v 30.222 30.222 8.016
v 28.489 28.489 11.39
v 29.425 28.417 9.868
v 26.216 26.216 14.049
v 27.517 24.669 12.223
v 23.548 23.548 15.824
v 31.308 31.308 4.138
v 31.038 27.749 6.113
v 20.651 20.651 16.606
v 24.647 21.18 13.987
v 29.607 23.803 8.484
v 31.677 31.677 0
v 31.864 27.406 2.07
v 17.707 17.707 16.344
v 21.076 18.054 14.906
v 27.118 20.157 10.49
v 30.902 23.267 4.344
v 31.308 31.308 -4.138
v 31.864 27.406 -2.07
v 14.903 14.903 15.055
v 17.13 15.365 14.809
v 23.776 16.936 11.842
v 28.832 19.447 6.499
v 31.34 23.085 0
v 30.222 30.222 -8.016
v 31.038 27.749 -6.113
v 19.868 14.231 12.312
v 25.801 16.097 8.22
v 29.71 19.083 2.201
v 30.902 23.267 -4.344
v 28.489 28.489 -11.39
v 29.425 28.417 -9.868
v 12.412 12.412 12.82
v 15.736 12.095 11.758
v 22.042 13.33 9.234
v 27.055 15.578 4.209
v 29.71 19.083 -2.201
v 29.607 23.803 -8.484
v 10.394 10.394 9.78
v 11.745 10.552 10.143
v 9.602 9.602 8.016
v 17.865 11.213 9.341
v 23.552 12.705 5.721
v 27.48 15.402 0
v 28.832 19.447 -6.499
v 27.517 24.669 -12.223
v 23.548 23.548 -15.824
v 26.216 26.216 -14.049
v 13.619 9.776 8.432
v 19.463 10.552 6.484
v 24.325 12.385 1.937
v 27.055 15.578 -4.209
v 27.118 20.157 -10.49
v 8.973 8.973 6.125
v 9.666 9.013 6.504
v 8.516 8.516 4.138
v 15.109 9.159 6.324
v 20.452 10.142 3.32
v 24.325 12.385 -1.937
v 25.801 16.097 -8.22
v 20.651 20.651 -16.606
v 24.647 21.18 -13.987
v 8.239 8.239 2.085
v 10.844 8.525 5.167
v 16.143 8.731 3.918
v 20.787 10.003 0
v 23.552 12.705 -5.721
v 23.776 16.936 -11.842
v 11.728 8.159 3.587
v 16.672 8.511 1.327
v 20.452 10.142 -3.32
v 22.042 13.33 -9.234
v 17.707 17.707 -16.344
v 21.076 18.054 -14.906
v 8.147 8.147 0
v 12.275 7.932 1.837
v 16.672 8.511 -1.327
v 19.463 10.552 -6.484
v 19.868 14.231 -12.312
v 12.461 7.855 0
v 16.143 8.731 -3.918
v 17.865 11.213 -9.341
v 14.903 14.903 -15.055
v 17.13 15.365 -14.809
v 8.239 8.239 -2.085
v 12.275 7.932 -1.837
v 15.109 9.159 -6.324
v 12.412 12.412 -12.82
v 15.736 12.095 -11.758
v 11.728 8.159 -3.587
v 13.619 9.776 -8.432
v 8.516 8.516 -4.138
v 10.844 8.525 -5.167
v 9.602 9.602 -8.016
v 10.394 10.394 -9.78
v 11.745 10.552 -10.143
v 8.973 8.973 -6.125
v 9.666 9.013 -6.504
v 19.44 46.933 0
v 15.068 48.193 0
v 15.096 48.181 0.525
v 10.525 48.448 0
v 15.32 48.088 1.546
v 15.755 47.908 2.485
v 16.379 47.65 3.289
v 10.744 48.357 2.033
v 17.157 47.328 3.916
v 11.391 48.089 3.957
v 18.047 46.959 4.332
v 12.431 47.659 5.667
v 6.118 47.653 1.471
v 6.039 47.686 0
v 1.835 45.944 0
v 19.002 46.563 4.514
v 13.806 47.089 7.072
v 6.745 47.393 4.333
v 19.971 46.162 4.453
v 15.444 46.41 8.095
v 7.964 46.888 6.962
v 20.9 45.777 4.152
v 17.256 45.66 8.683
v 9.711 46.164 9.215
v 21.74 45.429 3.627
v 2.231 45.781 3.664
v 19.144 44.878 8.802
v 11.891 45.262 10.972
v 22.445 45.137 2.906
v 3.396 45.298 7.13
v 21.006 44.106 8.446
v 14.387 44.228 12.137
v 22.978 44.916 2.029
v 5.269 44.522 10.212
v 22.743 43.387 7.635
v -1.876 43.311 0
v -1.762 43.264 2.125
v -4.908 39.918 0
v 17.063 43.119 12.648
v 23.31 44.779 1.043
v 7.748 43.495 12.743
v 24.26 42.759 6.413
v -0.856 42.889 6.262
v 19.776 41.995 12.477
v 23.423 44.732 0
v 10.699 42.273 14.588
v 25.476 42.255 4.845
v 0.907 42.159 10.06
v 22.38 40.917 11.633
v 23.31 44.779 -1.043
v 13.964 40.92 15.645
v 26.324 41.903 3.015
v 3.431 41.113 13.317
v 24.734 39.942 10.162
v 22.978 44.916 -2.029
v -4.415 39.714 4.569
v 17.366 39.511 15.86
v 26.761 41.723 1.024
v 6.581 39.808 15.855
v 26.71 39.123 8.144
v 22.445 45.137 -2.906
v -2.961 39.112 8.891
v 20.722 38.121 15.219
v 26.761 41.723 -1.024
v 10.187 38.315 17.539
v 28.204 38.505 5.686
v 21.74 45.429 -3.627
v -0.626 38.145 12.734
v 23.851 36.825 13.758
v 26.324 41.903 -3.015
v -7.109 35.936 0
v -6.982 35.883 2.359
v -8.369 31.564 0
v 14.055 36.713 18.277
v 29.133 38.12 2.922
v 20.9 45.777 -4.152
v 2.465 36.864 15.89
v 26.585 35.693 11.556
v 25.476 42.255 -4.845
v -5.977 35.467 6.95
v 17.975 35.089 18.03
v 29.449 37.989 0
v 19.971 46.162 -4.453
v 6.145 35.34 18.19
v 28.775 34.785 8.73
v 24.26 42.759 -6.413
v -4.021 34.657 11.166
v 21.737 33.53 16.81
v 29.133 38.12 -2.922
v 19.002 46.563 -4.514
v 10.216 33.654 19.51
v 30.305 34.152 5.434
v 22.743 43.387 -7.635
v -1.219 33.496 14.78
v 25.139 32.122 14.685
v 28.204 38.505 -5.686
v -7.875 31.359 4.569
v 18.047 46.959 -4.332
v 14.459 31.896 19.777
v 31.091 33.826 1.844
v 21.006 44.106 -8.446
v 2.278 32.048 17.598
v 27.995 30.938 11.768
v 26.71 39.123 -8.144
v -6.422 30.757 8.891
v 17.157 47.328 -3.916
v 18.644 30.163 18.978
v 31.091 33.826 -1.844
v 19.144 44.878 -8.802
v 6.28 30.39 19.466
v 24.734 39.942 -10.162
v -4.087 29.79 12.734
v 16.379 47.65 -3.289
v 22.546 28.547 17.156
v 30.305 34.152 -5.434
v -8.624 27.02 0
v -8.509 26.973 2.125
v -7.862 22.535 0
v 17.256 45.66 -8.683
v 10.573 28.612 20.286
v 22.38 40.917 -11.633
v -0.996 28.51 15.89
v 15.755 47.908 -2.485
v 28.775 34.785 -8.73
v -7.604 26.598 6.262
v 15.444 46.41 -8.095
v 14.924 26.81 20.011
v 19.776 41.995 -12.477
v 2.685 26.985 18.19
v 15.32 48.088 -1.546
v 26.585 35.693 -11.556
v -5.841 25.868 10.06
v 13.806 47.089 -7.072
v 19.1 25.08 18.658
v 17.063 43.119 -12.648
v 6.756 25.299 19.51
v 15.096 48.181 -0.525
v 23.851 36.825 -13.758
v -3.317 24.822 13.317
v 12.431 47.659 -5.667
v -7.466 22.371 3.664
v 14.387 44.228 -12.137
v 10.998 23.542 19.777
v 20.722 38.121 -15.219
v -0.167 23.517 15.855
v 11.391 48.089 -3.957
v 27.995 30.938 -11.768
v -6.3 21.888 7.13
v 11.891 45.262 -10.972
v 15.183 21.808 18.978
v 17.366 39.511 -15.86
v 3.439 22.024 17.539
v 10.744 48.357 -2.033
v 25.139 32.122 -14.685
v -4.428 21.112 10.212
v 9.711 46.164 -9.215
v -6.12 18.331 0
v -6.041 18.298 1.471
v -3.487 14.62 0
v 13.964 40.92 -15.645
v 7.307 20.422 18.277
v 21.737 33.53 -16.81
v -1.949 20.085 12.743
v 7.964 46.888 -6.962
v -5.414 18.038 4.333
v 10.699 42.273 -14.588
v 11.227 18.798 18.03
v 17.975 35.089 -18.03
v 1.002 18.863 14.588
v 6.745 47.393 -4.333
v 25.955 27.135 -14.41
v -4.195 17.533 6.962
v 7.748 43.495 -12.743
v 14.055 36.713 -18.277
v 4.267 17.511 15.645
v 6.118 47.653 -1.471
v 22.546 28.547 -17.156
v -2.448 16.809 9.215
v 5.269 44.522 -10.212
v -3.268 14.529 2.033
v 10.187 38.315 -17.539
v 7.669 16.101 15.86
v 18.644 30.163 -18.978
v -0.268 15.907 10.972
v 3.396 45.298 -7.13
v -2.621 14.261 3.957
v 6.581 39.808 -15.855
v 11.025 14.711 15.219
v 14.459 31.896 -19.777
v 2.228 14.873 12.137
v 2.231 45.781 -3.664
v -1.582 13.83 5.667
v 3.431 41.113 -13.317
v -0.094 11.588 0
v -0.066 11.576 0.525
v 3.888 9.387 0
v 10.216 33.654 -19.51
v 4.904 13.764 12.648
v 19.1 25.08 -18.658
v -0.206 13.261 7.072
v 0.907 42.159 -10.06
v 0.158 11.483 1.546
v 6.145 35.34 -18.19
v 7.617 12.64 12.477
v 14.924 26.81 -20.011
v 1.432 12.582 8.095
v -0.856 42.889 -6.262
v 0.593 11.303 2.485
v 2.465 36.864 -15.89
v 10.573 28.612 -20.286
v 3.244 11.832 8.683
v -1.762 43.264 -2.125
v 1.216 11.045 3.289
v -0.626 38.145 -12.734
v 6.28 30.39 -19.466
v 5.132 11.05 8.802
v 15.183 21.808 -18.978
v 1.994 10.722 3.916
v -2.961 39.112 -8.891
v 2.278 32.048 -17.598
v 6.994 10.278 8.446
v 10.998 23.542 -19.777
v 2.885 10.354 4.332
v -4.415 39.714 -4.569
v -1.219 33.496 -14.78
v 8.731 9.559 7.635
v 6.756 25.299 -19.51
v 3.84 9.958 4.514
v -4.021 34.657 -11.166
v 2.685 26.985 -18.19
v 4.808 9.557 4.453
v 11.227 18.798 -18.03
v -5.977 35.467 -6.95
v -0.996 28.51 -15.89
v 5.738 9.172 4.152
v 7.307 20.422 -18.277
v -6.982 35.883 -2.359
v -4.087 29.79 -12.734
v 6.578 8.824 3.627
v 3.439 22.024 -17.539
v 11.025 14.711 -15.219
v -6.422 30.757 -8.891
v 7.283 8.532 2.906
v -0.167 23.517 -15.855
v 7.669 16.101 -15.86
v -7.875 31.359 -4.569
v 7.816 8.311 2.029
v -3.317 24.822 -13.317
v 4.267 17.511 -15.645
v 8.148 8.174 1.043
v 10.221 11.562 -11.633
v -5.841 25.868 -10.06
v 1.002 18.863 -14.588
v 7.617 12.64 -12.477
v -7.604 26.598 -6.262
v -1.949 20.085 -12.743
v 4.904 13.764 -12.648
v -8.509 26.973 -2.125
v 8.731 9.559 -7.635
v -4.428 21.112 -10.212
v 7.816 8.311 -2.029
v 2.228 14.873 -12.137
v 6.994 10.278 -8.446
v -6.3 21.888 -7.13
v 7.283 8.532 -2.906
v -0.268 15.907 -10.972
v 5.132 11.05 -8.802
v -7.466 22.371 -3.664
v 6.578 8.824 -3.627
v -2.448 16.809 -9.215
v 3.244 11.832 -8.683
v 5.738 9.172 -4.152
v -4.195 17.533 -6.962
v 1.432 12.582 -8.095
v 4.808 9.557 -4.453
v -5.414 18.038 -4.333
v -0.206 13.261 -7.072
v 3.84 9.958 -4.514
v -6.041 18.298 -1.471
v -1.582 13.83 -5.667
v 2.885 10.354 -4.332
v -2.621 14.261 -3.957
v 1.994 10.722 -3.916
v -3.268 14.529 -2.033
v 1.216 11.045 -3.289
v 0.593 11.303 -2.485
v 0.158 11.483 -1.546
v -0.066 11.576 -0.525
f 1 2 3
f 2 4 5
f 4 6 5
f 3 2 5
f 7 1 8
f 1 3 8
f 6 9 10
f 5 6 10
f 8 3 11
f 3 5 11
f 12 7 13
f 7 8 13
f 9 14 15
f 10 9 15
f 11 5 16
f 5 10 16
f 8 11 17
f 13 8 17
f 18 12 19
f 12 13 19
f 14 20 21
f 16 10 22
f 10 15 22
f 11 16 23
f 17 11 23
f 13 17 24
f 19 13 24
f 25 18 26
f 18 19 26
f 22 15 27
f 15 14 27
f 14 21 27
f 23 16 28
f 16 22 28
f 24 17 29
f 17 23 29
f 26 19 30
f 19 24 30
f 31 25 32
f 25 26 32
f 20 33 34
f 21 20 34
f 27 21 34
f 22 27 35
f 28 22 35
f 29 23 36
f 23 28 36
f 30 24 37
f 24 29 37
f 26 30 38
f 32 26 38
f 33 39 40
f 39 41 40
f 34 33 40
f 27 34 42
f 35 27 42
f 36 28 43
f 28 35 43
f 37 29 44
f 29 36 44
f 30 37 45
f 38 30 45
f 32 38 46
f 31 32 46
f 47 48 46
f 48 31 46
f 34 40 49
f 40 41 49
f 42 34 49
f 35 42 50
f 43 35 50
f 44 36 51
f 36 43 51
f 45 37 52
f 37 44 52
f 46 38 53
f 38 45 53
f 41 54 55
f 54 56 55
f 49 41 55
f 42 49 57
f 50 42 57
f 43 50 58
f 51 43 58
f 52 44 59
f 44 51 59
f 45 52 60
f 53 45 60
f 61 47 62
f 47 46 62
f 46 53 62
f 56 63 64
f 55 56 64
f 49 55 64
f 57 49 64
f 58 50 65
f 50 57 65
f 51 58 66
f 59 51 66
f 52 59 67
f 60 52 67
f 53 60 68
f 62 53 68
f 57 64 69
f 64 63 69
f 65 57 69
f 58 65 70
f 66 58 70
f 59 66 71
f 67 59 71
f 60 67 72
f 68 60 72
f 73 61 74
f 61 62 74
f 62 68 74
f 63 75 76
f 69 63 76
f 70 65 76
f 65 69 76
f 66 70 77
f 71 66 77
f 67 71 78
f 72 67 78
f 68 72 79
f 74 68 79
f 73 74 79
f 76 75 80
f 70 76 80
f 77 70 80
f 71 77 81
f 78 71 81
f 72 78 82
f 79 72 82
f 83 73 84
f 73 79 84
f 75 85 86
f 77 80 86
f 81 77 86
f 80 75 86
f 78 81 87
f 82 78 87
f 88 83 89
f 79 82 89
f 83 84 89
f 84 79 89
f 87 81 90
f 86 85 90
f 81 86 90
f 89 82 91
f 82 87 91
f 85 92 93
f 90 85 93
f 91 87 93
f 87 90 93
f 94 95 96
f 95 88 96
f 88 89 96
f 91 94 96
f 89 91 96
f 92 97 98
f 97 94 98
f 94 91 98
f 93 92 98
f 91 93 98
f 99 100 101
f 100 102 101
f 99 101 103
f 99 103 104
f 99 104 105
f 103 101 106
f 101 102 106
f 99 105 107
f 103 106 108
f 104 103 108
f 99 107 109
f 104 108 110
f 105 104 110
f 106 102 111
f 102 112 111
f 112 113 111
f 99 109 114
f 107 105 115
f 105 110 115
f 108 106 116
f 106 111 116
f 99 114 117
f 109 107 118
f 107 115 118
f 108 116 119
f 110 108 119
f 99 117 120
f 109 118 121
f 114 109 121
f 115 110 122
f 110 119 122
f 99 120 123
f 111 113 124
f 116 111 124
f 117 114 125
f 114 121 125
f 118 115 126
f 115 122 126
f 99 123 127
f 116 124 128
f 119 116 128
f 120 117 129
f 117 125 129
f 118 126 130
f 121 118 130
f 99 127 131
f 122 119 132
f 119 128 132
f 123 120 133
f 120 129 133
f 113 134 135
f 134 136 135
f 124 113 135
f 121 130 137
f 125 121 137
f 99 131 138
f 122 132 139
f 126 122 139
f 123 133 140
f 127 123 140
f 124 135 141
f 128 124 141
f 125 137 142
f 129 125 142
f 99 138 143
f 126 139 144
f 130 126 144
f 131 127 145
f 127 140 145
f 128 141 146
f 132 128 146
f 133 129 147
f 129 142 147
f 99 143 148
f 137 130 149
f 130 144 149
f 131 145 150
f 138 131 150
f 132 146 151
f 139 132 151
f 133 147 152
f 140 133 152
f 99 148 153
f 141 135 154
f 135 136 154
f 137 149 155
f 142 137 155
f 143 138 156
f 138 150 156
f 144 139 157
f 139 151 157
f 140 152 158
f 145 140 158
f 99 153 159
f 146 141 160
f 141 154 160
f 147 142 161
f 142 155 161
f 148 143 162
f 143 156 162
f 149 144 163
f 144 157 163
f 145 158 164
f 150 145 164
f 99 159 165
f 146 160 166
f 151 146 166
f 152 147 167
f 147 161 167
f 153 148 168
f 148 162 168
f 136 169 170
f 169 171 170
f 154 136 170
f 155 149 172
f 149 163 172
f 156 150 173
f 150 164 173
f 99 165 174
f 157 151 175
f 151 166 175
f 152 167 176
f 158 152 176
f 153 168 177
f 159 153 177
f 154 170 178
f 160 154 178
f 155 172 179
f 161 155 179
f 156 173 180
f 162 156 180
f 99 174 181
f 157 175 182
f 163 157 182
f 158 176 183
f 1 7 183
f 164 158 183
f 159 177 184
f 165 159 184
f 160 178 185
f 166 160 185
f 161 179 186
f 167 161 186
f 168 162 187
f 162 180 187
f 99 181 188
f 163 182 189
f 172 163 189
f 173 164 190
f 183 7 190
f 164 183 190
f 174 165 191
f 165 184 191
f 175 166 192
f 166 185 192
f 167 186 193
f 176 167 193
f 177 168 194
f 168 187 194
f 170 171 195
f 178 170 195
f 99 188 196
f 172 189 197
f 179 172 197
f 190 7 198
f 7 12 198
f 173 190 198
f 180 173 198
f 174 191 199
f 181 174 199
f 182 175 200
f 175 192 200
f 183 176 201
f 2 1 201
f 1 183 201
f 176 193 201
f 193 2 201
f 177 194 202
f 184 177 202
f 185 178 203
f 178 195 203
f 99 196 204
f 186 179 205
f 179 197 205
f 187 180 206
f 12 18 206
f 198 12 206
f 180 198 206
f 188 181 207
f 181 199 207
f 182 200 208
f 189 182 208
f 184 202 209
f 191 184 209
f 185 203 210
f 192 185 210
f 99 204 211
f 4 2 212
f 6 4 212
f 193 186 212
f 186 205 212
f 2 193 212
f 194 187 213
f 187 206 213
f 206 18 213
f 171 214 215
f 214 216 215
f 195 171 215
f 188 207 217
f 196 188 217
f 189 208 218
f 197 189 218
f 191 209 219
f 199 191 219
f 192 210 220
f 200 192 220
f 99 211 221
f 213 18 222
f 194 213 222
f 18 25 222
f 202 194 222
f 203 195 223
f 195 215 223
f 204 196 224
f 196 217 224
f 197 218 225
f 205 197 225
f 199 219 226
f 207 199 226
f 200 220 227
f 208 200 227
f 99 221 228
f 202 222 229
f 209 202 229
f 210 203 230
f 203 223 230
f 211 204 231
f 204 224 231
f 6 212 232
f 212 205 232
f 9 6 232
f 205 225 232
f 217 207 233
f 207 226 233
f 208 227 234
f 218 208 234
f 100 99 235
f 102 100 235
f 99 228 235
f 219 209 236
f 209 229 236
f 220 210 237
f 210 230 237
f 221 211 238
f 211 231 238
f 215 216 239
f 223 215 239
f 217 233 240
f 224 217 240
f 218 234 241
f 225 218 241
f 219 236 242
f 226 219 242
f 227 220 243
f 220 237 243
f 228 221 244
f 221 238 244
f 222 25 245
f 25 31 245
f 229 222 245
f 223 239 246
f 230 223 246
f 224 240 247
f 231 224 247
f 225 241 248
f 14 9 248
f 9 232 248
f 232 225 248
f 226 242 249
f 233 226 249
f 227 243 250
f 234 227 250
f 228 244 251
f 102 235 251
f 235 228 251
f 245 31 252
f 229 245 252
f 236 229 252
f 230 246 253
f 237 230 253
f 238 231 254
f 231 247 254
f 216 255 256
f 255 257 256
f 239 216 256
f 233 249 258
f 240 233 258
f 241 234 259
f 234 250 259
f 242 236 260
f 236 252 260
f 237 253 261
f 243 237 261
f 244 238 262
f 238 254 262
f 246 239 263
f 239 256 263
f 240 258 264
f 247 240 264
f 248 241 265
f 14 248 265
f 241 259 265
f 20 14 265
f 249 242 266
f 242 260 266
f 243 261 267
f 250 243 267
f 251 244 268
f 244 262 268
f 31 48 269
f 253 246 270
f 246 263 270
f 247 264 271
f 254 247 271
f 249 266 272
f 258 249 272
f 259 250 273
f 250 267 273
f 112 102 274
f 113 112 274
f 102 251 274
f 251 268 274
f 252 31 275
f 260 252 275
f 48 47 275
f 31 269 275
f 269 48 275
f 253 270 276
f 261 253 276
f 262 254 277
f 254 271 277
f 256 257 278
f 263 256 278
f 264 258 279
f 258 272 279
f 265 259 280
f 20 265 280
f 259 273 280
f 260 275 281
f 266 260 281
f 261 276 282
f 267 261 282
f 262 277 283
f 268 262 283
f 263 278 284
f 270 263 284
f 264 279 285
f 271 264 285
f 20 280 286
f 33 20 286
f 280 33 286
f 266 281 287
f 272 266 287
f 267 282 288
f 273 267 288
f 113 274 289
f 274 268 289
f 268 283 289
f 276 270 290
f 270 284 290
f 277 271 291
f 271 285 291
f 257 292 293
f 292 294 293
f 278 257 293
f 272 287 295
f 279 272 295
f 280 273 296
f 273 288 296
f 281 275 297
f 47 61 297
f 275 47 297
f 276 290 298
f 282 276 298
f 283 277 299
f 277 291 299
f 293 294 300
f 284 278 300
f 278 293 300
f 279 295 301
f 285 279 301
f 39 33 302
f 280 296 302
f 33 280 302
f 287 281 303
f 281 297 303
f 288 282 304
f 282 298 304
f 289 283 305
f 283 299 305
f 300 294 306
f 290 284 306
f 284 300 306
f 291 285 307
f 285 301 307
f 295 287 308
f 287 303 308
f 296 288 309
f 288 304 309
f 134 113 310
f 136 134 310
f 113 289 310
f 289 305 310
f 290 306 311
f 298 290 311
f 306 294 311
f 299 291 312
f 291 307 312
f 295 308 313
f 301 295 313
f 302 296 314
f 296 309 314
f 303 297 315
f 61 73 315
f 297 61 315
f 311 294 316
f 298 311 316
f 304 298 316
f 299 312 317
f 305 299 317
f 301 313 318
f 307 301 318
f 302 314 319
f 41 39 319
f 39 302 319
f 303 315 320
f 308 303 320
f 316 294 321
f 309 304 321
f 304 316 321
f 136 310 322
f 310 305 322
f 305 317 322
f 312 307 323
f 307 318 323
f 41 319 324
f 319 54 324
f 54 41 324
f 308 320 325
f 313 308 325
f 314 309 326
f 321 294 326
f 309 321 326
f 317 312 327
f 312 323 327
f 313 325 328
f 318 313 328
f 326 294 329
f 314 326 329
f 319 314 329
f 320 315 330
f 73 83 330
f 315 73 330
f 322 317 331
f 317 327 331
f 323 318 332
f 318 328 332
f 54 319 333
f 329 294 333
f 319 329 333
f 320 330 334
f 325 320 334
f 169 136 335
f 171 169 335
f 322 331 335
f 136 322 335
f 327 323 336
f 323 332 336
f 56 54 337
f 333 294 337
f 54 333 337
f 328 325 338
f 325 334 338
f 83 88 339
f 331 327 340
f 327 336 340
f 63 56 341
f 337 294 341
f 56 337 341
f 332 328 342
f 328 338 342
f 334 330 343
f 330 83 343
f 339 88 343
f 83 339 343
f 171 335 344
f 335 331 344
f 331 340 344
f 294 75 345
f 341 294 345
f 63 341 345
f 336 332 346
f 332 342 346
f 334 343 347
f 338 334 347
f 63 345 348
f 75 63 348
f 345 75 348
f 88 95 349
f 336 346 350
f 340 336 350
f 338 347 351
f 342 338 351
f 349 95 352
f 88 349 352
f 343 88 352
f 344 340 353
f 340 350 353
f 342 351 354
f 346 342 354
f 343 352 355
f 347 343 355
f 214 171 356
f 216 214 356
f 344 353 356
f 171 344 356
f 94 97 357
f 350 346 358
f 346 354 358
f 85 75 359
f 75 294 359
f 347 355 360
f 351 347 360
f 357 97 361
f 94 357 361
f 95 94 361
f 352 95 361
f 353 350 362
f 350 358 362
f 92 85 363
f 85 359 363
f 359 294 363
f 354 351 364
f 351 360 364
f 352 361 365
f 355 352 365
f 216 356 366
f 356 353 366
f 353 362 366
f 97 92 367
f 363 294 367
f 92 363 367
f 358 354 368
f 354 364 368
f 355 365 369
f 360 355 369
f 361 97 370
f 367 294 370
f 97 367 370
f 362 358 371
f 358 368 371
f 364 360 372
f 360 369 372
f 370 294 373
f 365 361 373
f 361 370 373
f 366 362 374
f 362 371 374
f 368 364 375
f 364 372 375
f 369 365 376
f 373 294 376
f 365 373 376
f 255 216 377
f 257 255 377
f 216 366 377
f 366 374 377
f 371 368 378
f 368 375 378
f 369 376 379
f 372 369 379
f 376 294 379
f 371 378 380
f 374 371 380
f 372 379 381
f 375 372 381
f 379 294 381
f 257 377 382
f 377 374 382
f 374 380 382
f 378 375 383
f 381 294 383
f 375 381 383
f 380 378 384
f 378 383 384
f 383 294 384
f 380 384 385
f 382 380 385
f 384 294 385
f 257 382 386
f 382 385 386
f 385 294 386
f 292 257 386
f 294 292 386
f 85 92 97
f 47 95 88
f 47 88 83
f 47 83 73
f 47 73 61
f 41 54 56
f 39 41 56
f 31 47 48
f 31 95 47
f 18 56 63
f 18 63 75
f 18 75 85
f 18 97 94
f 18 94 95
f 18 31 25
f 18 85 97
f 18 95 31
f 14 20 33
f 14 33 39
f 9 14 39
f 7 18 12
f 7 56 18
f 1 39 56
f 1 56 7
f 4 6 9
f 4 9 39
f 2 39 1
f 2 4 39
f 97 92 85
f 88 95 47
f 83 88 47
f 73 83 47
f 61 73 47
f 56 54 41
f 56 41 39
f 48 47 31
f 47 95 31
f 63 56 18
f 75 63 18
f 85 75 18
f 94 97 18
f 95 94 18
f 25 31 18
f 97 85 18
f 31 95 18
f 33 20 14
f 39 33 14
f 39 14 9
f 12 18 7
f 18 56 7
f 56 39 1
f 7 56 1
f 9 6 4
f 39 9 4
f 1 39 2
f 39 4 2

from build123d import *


with BuildPart() as part:
    # Sketch1 → Revolve1 (revolve)
    with BuildSketch(Plane.XY):
        with BuildLine():
            Line((3.888063673, 9.38661605), (19.440318364, 46.933080252))
            ThreePointArc((19.440318364, 46.933080252), (-7.109041082, 35.935975497), (3.888063673, 9.38661605))
        make_face()
    revolve(axis=Axis((3.888063673, 9.38661605, 0), (0.3826834323650907, 0.9238795325112864, 0)))


with BuildPart() as body_2:
    # Intersect2: read off the stored shape, not the designer's step
    # Intersect2: the piece on the far side of the plane
    add(part.part)
    split(bisect_by=Plane(origin=(0, 0, 0), x_dir=(0.707106781186549, 0.707106781186546, 0), z_dir=(0.707106781186546, -0.707106781186549, 0)), keep=Keep.BOTTOM)


with BuildPart() as part_1:
    add(part.part)

    # Intersect2
    split(bisect_by=Plane(origin=(0, 0, 0), x_dir=(0.707106781186549, 0.707106781186546, 0), z_dir=(0.707106781186546, -0.707106781186549, 0)), keep=Keep.TOP)


solid = Compound([body_2.part, part_1.part])
